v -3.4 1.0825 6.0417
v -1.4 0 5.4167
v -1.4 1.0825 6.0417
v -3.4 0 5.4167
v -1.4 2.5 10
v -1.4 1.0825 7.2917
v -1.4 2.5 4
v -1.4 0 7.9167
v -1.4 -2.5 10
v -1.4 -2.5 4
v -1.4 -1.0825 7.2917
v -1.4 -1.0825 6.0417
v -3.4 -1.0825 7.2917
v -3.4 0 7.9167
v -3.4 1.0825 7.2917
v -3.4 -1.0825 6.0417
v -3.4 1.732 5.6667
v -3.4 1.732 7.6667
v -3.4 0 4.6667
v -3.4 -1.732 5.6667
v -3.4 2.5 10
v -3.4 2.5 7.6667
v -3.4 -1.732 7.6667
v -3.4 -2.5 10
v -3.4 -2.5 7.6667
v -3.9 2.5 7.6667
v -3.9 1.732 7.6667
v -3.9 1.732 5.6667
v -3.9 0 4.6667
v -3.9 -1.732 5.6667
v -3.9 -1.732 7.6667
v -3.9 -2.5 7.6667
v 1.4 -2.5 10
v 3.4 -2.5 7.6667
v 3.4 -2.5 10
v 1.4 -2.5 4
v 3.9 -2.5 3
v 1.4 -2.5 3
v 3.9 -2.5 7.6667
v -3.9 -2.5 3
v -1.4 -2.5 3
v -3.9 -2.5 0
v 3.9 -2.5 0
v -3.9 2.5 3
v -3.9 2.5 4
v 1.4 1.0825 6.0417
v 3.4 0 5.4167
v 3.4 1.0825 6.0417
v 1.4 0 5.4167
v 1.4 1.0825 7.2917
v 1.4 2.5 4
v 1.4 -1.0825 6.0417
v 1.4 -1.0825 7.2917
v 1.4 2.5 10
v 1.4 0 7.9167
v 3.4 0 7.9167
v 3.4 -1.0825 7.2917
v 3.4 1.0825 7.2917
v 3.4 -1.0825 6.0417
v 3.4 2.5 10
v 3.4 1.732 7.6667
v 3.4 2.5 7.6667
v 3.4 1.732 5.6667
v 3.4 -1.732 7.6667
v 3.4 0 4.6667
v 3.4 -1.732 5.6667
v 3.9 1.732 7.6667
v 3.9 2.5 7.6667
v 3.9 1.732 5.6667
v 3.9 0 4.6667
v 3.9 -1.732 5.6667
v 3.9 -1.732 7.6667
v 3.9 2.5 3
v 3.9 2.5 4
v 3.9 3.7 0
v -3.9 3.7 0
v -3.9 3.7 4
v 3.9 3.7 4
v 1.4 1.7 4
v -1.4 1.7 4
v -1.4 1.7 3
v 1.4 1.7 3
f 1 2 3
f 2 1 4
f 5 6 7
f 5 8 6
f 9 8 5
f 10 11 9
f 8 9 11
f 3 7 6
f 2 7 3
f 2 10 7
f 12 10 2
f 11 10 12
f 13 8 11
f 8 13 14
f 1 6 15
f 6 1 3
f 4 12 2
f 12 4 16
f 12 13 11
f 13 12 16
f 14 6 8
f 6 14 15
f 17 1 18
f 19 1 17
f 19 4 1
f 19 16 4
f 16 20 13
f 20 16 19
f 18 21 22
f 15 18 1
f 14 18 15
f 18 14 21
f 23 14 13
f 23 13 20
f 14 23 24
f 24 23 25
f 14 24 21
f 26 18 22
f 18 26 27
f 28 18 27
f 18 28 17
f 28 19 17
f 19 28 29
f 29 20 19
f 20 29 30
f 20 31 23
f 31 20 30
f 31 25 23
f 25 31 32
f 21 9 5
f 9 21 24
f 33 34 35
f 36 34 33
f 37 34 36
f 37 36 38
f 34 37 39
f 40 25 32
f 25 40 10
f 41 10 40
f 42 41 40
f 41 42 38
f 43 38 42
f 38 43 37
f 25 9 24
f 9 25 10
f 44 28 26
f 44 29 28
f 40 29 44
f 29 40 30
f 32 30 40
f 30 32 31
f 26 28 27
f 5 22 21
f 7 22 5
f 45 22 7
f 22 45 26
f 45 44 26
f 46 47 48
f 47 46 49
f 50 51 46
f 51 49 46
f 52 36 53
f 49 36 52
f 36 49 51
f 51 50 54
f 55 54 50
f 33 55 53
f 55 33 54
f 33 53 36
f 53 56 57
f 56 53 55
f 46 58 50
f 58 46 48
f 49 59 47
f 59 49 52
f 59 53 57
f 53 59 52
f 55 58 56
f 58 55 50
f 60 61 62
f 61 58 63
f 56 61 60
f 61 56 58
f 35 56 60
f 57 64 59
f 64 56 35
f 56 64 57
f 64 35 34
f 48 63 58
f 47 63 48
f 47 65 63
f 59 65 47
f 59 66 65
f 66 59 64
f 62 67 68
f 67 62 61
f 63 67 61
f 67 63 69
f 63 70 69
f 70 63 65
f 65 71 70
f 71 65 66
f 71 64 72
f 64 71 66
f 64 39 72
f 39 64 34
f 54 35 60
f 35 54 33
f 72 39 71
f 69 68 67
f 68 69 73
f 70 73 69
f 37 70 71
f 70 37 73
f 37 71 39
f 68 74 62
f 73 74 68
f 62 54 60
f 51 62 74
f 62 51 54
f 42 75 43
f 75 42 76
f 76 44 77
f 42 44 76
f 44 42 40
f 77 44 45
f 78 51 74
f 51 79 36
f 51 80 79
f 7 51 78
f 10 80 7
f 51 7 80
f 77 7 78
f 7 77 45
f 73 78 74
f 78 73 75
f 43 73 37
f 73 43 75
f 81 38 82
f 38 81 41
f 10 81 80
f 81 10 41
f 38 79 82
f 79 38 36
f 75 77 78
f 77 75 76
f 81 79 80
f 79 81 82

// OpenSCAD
// Insert
base_x = 5;
base_width = 2.5;

// Hinge
receiver_height = 10;
receiver_width = 5;
width = 2.5;
bore = 2.5;
tol = 0.3;

module receiver() {    
    module triangle() {
        difference() {
            linear_extrude(width)
            polygon([
                [3,0],
                [receiver_height, 0],
                [receiver_height, receiver_width],
                [3,receiver_width],
                [3,receiver_width],
            ]);
            
            translate([(receiver_height)/2.4+bore, receiver_width/2,0])
            union() {
                linear_extrude(width)            
                circle(d=bore, $fn=6);
                           
                translate([0, 0, 2])
                linear_extrude(width)
                union() {
                    circle(d=4, $fn=6);
                    translate([3, 2, 0])
                    square([4, 100], center=true);
                }
            }
        }
    }
    
    translate([0, 0, tol/2])
    triangle();
    
    mirror([0, 0, 1])
    translate([0, 0, base_width+tol/2])
    triangle();
}

translate([-base_width/2, -receiver_width/2 ,0])
rotate([0,-90,0])
receiver();

difference() {
    linear_extrude(4)
    square([width*2+receiver_width/2+tol, receiver_width], center=true);
    
    
    translate([0, 0, 3])
    linear_extrude(5)
    square([base_width+tol, base_x*1.25], center=true);
}

// Wall
color("red")
translate([0, (base_width+width)/2-tol+(2/4), 0])
linear_extrude(4)
square([width*2+receiver_width/2+tol, 2], center=true);
